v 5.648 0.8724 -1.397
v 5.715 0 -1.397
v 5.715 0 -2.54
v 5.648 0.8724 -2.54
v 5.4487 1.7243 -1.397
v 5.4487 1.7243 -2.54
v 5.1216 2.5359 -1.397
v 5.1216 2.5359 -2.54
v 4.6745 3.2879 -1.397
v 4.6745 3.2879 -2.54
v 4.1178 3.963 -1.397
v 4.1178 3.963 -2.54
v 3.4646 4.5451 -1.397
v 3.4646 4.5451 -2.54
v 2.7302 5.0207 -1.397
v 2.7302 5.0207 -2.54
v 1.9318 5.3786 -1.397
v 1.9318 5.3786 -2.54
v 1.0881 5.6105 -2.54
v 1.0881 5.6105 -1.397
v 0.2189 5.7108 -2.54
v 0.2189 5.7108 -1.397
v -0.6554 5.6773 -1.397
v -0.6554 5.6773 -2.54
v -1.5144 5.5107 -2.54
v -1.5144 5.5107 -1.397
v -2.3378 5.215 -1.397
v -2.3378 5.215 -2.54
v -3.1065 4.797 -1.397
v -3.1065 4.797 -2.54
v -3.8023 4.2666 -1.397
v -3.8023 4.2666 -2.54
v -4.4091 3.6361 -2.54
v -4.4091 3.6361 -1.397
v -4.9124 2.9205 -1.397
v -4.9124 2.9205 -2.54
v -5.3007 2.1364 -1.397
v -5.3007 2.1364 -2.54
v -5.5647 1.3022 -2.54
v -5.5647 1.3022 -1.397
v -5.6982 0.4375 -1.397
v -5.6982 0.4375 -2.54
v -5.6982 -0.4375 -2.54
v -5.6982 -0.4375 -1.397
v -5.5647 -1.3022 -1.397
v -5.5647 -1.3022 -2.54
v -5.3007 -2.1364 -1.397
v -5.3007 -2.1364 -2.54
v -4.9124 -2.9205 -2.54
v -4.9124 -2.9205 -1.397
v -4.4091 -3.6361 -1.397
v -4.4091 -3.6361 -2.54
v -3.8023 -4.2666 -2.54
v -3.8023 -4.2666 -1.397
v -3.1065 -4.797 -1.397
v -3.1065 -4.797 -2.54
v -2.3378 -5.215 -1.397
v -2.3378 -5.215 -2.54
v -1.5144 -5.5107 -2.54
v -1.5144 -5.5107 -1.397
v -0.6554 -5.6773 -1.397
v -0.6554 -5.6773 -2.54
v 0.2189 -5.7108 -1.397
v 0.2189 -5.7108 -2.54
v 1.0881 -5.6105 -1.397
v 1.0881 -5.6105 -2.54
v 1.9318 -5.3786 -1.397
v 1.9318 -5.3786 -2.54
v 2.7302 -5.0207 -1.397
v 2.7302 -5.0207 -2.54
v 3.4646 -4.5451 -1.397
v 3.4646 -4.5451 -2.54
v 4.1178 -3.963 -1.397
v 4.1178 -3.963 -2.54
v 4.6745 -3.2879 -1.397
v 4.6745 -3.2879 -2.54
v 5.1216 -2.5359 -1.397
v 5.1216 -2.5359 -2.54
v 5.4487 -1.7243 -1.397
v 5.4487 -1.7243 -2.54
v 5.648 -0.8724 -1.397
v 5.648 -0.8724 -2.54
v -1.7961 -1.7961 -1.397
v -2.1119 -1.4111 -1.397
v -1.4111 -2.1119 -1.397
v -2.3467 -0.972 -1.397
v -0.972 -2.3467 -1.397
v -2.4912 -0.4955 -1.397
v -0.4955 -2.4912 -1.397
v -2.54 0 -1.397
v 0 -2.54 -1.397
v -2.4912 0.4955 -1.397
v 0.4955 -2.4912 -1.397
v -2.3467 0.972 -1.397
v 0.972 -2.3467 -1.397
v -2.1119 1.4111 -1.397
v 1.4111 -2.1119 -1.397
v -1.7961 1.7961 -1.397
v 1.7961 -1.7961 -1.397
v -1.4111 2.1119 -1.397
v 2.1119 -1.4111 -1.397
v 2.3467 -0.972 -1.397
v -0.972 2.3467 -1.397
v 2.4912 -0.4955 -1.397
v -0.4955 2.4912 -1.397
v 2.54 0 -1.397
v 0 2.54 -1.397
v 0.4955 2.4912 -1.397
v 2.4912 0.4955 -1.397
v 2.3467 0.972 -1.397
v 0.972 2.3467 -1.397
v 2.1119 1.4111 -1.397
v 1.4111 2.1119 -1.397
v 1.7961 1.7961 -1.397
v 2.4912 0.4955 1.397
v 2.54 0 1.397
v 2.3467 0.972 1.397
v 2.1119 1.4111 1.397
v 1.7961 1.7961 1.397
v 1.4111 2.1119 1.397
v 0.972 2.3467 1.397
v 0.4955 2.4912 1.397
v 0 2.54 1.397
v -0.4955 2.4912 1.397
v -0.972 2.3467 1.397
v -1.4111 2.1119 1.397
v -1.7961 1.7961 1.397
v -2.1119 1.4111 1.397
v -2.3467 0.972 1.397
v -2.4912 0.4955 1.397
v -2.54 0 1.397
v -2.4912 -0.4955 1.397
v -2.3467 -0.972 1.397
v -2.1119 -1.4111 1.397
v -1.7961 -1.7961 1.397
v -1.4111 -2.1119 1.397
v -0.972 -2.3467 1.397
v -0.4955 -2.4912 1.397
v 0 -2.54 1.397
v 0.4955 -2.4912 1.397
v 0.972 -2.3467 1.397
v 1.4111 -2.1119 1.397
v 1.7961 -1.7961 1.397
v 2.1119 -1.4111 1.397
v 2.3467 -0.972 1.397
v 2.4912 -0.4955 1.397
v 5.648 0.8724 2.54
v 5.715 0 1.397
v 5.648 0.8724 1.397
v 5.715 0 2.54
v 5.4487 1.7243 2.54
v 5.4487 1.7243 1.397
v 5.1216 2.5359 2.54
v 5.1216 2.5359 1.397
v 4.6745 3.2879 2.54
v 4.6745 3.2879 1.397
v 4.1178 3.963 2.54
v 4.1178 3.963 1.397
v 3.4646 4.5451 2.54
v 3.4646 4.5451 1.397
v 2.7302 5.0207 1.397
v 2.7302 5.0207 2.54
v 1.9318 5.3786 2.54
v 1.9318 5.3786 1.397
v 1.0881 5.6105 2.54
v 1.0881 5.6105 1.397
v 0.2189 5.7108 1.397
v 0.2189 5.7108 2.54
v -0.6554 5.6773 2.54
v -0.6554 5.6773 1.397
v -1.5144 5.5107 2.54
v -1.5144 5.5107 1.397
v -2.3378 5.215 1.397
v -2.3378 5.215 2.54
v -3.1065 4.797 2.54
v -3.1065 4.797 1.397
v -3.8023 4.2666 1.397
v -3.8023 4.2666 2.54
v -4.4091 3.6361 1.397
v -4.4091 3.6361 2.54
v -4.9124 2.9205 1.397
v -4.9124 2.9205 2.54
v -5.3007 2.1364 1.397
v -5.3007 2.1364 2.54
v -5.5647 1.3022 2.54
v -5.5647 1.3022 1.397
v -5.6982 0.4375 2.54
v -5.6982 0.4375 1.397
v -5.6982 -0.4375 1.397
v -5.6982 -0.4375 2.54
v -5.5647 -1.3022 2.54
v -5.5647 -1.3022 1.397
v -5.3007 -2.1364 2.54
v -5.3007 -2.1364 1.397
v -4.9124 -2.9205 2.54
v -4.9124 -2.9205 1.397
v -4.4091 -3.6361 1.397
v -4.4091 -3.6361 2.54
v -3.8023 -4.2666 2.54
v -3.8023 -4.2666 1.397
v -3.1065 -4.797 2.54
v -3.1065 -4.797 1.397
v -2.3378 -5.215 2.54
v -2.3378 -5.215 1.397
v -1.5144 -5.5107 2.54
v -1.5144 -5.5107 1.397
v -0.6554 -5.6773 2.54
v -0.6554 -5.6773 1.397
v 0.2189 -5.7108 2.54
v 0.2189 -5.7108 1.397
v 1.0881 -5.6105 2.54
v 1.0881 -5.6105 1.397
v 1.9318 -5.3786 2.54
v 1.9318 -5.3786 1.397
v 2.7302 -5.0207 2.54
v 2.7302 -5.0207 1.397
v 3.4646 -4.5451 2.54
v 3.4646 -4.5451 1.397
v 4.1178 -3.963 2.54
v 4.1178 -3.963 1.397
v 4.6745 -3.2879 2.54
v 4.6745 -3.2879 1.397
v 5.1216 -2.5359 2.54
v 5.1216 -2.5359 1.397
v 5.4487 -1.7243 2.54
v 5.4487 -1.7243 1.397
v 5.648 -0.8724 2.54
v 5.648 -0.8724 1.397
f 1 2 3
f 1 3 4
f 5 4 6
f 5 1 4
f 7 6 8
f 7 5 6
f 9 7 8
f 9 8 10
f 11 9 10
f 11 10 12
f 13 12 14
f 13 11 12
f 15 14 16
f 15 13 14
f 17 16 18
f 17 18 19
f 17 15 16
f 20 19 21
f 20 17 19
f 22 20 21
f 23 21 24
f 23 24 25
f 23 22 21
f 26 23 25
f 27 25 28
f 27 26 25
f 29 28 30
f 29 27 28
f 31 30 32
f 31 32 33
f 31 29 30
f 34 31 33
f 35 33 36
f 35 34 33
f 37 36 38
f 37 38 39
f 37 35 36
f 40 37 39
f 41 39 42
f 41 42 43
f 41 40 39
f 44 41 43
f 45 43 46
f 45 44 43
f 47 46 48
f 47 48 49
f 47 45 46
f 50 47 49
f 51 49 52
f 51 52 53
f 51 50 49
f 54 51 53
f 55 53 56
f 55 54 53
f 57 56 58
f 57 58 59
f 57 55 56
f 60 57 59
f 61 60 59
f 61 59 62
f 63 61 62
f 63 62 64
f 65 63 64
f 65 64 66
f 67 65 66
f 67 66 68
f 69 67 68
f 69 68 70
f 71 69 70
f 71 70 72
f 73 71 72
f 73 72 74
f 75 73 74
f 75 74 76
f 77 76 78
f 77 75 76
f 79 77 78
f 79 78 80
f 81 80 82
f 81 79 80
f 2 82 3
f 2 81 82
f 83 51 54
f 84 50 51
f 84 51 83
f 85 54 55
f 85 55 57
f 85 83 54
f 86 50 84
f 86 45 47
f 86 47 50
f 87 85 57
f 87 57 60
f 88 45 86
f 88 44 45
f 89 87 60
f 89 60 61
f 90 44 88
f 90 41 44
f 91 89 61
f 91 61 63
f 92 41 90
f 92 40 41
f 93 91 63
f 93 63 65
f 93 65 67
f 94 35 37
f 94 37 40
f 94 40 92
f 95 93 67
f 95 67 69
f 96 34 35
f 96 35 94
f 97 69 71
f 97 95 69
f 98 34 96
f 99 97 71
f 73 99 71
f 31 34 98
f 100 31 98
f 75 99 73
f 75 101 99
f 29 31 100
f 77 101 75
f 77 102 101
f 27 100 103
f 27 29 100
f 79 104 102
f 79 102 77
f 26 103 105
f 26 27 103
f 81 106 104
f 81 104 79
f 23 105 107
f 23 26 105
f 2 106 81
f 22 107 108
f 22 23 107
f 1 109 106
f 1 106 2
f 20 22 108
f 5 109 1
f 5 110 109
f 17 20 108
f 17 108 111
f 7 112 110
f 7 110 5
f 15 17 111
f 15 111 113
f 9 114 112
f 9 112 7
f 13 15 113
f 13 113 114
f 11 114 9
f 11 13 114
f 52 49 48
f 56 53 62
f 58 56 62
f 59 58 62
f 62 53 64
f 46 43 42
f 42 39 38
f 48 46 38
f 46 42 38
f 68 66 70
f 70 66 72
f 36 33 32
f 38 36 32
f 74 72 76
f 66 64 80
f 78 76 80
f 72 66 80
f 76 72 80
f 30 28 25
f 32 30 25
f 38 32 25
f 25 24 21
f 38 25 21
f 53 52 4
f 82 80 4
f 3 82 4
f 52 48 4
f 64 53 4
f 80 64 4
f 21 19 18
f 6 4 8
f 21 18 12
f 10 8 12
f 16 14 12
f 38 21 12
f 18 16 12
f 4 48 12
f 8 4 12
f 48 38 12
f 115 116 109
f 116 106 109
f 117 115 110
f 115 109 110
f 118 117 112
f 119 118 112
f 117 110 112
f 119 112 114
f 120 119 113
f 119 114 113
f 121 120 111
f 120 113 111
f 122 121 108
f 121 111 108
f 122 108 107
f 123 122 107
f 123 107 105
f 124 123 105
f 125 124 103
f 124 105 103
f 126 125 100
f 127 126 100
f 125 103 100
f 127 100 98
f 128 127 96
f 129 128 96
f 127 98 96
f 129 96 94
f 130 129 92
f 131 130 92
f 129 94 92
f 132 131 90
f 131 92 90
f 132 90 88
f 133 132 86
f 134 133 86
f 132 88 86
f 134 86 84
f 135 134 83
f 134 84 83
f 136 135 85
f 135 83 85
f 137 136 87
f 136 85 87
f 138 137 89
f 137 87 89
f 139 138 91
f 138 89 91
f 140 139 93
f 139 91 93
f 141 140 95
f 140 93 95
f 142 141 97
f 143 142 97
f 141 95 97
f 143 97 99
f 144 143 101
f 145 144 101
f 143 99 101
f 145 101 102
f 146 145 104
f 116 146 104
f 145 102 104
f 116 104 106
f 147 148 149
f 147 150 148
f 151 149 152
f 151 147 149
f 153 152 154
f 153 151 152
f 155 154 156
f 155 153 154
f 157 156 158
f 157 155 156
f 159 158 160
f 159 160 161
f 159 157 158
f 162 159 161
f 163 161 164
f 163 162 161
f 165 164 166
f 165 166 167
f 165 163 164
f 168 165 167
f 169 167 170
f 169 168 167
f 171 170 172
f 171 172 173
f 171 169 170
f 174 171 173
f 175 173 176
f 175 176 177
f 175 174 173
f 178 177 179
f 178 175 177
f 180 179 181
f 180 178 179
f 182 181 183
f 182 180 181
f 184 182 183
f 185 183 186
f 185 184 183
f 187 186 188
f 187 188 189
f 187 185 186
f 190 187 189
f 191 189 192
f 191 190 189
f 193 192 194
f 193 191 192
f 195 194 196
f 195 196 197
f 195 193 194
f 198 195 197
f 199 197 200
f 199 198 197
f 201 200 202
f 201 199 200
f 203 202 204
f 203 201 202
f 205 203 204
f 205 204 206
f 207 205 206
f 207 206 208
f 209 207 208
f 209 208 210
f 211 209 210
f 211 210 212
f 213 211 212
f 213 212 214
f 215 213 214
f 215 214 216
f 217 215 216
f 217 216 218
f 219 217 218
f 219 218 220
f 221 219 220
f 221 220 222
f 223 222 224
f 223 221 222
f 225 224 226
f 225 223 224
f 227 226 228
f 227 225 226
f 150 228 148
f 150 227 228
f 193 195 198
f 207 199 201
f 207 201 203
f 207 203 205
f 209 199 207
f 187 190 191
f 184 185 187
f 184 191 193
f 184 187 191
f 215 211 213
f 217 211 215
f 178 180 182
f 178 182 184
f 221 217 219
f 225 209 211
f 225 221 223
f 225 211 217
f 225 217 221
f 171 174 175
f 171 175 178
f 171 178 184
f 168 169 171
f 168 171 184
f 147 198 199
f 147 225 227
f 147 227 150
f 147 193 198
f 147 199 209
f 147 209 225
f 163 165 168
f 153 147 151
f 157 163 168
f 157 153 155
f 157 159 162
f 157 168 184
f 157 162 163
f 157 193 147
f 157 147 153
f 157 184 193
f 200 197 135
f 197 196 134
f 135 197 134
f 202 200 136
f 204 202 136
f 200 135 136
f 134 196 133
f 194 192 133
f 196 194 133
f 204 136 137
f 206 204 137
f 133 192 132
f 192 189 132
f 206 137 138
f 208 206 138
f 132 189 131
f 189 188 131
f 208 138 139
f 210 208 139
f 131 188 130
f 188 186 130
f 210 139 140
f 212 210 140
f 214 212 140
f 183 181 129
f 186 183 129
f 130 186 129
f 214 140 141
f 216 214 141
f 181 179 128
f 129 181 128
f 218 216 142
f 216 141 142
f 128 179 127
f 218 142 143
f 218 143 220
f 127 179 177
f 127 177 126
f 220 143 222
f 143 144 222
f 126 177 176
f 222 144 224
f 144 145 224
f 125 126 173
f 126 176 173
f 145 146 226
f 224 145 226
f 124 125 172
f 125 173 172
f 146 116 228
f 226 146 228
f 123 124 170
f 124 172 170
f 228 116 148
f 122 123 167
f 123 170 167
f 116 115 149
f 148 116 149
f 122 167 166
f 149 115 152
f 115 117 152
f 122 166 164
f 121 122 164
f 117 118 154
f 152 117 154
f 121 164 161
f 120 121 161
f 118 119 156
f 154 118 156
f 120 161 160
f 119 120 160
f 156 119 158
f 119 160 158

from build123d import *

# Parameters (mm, degrees)
F0_R     = 5.715
F0_R_2   = 2.54
F1_DEPTH = 2.54
F2_DEPTH = 1.397


with BuildPart() as f1:
    # F0 (on Top) → F1 (new body, symmetric)
    with BuildSketch(Plane.XY):
        Circle(F0_R)
        Circle(F0_R_2, mode=Mode.SUBTRACT)
        Circle(F0_R_2)
    extrude(amount=F1_DEPTH, both=True)

    # F0 (on Top) → F2 (cut, symmetric)
    with BuildSketch(Plane.XY):
        Circle(F0_R)
        Circle(F0_R_2, mode=Mode.SUBTRACT)
    extrude(amount=F2_DEPTH, both=True, mode=Mode.SUBTRACT)


solid = f1.part
